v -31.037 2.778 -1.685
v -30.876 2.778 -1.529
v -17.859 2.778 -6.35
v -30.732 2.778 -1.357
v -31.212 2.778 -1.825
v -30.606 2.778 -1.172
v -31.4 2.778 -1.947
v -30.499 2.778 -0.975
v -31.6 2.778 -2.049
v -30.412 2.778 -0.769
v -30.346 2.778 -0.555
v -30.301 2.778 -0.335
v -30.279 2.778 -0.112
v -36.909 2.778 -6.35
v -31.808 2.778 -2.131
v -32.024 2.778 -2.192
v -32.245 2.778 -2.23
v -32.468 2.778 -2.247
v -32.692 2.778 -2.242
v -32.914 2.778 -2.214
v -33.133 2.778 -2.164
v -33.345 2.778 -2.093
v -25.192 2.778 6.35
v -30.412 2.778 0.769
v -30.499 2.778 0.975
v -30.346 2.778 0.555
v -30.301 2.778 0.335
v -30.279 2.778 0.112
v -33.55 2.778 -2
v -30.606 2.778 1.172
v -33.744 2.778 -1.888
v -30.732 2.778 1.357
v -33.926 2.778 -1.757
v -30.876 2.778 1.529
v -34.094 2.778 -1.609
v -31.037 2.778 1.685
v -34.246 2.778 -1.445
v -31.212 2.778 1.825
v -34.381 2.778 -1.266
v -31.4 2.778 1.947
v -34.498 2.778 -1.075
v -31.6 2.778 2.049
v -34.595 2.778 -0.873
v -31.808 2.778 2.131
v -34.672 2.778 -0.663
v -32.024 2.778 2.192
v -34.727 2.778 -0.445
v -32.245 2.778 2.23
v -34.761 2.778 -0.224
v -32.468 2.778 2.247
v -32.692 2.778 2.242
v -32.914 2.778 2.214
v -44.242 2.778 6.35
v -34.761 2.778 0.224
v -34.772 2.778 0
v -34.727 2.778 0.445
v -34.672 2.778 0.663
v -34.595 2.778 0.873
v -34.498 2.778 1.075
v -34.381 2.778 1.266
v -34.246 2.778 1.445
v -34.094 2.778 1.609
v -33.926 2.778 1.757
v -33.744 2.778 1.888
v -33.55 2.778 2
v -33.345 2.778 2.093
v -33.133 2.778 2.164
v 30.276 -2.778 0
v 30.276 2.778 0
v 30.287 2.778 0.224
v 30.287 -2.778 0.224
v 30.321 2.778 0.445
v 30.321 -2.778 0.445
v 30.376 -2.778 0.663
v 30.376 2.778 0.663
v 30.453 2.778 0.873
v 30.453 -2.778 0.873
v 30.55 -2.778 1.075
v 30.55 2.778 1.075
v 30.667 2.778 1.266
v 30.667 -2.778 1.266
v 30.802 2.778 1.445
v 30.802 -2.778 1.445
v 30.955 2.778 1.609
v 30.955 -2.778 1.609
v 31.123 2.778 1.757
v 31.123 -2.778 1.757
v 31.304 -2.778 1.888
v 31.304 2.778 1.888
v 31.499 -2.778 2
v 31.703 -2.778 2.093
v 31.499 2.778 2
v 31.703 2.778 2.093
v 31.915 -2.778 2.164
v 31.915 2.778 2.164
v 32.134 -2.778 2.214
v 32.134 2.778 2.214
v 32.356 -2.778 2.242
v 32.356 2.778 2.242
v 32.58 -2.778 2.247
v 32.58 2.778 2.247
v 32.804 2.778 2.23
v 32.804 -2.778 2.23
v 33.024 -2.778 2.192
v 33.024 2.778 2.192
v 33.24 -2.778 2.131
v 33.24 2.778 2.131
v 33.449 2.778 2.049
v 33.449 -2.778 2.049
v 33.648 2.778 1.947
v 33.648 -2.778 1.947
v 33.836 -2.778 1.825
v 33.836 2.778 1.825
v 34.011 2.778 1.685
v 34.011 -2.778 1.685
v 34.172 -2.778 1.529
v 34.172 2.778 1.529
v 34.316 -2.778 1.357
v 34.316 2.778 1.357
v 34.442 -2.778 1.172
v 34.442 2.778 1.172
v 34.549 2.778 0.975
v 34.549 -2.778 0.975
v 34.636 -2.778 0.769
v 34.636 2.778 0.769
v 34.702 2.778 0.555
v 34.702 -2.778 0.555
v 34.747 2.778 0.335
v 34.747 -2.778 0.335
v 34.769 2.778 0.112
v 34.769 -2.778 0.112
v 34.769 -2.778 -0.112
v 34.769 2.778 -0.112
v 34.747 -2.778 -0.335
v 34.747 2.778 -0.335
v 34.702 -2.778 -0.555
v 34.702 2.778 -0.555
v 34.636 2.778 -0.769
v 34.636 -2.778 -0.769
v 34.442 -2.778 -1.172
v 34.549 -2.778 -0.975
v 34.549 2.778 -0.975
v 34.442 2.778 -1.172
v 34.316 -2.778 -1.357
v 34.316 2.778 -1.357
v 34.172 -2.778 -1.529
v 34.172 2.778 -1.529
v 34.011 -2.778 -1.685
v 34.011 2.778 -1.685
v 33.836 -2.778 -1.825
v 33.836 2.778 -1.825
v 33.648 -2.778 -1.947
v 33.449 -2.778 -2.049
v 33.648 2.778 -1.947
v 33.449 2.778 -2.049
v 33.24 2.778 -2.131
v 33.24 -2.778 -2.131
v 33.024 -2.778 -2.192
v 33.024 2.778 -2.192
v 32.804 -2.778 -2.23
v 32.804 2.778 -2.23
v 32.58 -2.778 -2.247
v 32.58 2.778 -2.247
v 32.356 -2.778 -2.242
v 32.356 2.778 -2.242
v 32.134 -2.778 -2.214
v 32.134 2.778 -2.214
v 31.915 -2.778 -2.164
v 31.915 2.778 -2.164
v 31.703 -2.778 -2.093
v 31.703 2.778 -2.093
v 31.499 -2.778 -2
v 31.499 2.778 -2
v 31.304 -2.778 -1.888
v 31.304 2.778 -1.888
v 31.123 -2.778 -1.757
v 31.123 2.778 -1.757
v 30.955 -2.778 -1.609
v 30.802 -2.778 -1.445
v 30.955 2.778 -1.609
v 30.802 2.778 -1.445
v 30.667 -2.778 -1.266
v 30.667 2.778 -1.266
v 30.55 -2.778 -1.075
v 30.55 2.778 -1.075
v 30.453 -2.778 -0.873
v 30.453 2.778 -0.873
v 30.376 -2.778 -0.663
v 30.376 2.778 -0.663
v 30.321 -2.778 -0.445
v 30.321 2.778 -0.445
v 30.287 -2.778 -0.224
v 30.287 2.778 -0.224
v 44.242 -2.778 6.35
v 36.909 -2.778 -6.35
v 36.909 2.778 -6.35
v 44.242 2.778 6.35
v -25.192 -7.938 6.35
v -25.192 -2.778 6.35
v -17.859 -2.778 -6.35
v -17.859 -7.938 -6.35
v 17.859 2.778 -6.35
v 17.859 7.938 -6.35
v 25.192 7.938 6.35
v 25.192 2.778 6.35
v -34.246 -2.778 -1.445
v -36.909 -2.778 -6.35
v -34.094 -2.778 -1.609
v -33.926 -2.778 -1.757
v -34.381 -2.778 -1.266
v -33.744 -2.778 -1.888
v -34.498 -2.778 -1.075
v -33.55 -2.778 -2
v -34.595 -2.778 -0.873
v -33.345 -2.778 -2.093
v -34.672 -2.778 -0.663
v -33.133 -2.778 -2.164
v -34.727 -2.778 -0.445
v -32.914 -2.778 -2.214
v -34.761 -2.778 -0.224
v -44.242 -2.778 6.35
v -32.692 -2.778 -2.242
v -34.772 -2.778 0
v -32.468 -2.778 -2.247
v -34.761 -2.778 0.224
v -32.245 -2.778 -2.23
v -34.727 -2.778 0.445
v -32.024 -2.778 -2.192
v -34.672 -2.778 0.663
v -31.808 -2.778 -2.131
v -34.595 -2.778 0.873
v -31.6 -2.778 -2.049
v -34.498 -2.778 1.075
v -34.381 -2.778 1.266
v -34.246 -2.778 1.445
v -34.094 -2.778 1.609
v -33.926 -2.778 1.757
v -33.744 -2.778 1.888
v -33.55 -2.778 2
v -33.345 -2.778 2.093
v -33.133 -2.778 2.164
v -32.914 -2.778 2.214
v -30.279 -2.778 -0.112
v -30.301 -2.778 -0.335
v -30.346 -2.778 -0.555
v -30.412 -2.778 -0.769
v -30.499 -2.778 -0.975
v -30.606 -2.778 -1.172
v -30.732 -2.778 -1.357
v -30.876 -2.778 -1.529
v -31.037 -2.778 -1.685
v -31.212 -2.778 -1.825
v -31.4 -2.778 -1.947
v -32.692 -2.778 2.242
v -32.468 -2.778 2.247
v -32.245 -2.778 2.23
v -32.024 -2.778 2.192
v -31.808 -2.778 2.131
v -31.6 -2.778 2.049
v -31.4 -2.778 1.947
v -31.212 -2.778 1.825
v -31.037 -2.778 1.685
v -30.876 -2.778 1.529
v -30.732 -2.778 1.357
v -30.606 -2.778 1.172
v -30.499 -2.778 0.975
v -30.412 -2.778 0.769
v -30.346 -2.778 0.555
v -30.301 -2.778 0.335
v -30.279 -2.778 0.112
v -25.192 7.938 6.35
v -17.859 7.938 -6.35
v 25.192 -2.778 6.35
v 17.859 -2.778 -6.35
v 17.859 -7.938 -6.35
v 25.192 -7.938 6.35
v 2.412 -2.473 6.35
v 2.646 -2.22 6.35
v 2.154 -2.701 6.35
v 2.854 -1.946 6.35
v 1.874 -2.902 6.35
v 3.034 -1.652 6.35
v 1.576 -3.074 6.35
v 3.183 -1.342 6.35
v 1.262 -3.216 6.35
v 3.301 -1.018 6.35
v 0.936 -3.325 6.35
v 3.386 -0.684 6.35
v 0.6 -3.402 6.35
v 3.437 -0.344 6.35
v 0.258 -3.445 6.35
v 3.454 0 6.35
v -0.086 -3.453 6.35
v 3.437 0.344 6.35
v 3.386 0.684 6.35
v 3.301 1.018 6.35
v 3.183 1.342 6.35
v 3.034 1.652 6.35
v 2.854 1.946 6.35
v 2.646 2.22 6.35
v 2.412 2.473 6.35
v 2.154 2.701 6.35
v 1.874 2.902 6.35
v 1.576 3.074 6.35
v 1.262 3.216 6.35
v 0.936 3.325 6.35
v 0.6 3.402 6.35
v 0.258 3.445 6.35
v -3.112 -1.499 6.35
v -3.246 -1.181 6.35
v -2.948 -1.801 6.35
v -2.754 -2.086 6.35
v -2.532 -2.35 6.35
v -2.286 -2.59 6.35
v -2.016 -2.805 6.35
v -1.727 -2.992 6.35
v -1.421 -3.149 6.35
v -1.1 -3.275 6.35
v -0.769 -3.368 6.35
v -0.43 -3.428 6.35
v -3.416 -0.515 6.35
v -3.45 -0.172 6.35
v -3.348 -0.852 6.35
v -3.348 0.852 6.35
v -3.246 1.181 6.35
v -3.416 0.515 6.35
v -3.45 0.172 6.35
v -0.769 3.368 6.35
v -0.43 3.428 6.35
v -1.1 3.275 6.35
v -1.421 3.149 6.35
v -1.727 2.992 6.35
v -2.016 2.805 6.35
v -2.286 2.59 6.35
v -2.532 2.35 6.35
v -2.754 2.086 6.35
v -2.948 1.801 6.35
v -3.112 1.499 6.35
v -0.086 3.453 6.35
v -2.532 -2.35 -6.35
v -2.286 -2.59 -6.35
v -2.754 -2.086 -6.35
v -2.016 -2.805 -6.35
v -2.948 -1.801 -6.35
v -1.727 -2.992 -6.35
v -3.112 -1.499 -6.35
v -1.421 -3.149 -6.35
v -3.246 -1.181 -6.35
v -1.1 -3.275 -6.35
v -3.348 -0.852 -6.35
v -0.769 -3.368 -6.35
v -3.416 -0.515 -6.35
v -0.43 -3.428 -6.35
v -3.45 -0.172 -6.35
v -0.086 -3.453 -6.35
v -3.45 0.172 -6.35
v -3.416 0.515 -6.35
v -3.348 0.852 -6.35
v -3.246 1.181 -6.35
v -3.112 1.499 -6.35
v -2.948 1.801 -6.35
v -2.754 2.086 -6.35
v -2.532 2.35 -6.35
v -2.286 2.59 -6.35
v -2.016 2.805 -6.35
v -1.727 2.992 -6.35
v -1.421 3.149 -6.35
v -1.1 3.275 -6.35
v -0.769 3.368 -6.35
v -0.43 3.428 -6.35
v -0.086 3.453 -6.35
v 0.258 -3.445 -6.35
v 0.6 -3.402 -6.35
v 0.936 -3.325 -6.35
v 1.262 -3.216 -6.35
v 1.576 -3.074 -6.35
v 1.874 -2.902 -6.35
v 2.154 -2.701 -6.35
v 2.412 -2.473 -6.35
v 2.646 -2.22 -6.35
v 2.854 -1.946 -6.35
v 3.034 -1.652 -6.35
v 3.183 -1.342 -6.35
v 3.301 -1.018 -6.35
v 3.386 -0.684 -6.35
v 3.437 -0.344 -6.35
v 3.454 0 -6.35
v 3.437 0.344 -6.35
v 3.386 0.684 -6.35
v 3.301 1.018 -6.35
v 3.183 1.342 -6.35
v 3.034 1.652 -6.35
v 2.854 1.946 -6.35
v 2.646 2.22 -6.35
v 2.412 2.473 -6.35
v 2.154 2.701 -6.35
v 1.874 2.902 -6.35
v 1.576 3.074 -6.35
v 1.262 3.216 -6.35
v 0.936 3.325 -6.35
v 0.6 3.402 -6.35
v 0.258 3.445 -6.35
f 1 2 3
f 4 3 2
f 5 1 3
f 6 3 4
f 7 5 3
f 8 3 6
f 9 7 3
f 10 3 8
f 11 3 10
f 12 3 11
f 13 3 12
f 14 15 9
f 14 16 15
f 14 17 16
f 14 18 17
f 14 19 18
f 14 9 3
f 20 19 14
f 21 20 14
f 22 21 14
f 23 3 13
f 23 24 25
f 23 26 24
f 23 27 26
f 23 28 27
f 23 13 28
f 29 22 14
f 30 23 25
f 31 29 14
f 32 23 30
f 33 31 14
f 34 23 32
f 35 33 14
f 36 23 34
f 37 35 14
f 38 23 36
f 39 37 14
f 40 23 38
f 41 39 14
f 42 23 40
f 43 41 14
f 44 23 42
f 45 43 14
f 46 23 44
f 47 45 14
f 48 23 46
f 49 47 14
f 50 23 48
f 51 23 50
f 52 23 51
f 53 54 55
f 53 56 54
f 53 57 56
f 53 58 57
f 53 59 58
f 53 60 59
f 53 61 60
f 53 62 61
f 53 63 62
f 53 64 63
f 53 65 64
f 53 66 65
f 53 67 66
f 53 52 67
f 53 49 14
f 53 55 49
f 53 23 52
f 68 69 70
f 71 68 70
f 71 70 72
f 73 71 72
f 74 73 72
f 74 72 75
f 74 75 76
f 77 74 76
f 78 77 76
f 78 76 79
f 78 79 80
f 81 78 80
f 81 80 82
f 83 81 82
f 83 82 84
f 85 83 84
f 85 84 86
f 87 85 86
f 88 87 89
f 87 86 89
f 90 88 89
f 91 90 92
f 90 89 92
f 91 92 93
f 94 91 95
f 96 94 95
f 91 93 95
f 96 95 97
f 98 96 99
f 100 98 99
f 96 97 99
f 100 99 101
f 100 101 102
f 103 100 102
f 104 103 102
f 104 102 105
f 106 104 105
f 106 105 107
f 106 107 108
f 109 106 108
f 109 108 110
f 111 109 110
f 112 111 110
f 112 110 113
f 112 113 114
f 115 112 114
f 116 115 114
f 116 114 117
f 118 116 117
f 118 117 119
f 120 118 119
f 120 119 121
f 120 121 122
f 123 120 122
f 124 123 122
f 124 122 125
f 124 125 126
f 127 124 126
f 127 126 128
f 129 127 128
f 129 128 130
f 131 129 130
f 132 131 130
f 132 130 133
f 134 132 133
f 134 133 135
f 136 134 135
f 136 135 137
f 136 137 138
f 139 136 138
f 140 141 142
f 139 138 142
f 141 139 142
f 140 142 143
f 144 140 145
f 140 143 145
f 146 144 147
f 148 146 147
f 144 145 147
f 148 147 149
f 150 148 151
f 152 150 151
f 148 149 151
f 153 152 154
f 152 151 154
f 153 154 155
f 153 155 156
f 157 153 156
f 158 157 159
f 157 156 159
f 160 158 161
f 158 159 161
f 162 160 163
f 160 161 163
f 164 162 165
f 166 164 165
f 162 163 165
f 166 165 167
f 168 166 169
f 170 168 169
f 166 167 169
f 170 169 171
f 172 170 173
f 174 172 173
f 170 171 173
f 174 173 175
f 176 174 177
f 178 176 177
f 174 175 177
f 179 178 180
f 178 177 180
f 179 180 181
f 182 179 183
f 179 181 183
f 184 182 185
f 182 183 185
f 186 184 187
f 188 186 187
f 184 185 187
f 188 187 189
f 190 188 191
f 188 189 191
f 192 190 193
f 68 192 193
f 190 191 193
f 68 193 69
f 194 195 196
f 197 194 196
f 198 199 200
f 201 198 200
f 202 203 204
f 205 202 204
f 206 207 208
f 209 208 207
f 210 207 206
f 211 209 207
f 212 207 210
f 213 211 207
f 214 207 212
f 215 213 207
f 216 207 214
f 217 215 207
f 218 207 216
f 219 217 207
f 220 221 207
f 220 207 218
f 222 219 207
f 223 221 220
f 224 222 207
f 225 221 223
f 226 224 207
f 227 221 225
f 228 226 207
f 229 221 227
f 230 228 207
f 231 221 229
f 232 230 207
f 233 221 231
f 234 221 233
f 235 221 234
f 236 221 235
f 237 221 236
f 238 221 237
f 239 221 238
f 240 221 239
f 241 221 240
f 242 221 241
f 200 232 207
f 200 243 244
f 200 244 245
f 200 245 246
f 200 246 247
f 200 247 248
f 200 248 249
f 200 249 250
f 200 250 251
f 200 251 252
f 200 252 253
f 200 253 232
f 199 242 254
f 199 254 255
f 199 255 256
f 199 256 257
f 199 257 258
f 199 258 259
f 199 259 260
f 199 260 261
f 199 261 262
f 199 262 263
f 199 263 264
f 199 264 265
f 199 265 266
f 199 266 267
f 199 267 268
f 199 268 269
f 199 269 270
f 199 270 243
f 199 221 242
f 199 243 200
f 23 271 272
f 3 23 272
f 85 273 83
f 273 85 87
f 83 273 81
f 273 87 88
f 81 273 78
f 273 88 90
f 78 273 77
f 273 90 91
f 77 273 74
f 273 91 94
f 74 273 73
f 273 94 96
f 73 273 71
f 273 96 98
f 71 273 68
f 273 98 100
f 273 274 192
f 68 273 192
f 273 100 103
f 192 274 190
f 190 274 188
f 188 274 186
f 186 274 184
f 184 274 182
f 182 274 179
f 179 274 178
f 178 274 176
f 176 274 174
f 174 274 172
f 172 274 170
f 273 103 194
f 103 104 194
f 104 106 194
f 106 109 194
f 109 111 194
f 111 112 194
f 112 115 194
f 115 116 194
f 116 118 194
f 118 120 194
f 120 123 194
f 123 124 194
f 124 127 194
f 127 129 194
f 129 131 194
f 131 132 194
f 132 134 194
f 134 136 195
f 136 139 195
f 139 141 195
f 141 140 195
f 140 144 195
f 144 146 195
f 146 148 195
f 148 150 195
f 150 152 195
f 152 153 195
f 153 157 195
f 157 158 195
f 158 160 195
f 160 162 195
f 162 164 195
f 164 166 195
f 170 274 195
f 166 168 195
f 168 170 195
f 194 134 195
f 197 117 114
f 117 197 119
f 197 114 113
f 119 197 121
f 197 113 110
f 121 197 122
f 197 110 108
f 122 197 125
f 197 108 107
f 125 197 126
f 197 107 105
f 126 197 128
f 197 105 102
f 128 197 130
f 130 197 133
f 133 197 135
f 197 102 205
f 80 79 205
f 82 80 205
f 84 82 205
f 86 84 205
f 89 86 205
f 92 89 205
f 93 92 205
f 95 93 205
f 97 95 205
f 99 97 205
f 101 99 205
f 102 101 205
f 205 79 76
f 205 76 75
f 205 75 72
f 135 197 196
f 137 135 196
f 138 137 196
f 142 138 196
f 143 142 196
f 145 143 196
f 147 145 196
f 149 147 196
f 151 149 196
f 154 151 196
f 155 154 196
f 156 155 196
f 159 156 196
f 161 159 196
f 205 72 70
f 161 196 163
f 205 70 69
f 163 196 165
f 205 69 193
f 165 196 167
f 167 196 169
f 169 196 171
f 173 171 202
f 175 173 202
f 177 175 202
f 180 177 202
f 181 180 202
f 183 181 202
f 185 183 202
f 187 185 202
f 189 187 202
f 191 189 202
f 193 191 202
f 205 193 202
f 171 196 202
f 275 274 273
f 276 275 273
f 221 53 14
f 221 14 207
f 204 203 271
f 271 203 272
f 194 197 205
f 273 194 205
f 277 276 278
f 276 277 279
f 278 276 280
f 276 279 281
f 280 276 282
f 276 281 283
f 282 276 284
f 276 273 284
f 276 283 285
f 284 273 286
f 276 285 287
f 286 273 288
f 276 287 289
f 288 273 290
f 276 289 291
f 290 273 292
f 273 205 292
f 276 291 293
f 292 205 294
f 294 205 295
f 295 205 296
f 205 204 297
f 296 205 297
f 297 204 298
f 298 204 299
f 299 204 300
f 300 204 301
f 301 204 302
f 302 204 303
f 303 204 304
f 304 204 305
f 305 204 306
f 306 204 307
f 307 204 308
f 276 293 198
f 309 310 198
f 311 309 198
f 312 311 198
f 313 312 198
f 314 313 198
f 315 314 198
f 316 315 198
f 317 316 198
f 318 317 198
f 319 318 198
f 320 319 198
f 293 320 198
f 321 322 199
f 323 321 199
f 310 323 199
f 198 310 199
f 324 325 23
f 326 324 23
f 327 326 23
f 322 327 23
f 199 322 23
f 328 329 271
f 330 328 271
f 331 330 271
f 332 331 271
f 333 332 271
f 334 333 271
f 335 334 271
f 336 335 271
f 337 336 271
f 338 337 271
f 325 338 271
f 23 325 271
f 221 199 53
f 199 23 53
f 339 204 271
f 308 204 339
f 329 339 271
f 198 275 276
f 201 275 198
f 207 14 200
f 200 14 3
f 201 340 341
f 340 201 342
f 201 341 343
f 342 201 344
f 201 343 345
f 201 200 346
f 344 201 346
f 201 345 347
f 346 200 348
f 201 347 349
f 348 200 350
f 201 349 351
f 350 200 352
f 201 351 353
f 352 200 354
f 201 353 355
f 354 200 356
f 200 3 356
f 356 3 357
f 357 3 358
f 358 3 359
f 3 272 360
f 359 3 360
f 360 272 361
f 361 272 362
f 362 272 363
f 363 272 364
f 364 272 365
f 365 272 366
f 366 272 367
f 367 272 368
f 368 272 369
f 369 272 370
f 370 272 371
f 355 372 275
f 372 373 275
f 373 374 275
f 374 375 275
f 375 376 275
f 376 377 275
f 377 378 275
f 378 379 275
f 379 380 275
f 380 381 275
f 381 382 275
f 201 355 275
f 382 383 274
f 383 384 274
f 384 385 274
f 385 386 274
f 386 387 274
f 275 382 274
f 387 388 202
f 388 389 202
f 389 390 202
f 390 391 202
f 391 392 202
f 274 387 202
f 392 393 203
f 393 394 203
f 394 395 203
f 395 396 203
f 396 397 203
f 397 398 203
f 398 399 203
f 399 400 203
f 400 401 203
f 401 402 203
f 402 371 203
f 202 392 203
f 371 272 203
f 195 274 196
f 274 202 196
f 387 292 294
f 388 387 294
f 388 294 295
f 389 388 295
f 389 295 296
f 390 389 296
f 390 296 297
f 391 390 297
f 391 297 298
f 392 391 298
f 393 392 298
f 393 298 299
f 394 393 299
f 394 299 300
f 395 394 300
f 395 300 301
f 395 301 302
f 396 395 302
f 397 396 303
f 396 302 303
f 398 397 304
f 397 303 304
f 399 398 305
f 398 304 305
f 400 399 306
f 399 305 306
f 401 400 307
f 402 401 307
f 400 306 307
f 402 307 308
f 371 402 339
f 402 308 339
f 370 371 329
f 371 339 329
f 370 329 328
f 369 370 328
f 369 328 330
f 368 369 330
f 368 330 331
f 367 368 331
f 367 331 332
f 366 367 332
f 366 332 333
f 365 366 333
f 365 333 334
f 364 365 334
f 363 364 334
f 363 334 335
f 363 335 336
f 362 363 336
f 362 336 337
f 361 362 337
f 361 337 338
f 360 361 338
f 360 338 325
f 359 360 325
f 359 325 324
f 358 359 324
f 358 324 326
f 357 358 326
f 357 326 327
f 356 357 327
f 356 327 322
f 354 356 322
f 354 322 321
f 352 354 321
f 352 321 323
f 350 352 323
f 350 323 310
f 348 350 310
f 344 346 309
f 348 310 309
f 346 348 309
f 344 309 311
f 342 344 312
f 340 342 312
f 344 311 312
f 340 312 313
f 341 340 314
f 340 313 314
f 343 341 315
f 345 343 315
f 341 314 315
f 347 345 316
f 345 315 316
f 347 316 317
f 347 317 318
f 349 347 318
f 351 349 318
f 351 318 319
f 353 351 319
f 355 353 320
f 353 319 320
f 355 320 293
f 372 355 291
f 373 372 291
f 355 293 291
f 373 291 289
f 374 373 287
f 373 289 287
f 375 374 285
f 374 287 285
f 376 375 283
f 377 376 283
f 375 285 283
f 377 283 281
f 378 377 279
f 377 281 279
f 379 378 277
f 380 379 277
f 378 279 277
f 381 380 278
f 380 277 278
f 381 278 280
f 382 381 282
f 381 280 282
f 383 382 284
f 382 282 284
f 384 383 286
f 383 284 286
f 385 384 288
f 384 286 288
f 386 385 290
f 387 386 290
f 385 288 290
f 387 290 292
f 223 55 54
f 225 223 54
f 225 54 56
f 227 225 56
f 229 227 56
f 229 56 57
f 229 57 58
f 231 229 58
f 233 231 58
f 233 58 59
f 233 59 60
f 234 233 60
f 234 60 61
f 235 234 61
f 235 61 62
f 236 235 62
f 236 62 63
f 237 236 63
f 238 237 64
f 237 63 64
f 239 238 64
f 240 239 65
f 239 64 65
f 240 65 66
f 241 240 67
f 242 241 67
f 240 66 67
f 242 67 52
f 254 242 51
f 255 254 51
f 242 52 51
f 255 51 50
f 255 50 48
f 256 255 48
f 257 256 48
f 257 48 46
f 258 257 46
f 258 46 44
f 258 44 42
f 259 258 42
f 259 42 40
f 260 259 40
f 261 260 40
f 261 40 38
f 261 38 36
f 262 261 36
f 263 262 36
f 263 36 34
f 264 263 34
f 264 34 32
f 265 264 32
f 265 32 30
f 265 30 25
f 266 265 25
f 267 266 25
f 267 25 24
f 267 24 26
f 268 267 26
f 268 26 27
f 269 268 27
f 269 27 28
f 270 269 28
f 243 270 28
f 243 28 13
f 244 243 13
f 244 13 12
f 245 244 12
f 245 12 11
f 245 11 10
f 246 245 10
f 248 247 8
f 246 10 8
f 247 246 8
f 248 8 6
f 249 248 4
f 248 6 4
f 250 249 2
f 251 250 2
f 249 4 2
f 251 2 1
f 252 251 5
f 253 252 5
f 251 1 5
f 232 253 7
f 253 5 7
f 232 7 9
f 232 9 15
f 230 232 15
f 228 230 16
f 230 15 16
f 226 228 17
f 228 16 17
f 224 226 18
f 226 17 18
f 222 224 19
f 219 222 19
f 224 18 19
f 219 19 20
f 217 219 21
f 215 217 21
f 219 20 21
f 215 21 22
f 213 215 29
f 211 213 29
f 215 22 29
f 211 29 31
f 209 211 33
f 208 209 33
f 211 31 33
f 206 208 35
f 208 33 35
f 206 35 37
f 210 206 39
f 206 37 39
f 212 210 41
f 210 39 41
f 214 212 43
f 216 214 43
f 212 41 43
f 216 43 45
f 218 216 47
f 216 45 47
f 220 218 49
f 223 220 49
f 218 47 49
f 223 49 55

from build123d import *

# Parameters (mm, degrees)
BOSS_EXTRUDE1_DEPTH = 7.9375
SKETCH5_R           = 3.4544
CUT_EXTRUDE2_DEPTH  = 30.30728297
SKETCH6_W           = 19.05
SKETCH6_H           = 5.55625
SKETCH7_W           = 19.05
SKETCH7_H           = 5.55625
CUT_EXTRUDE3_REACH  = 47.962
SKETCH8_R           = 2.2479


with BuildPart() as part:
    # Sketch2 → Boss-Extrude1 (new, symmetric)
    with BuildSketch(Plane(origin=(0, 0, 0), x_dir=(1, 0, 0), z_dir=(0, 1, 0))):
        Polygon((-17.859375, 6.35), (17.859375, 6.35), (25.191723419, -6.35), (-25.191723419, -6.35), align=None)
    extrude(amount=BOSS_EXTRUDE1_DEPTH, both=True)

    # Sketch5 → Cut-Extrude2 (cut, through all)
    with BuildSketch(Plane.XY.offset(6.35)):
        Circle(SKETCH5_R)
    extrude(amount=-CUT_EXTRUDE2_DEPTH, mode=Mode.SUBTRACT)

    # Sweep1: sweep along a curve in space
    with BuildLine() as sweep1_path:
        Line((-17.859375, 7.9375, -6.35), (-25.191723419, 7.9375, 6.35))
    # Sketch6 → Sweep1 (sweep)
    with BuildSketch(Plane.XY.offset(6.35)):
        with Locations((-34.716723419, 0)):
            Rectangle(SKETCH6_W, SKETCH6_H)
    sweep(path=sweep1_path.line)

    # Sweep2: sweep along a curve in space
    with BuildLine() as sweep2_path:
        Line((25.191723419, 7.9375, 6.35), (17.859375, 7.9375, -6.35))
    # Sketch7 → Sweep2 (sweep)
    with BuildSketch(Plane.XY.offset(6.35)):
        with Locations((34.716723419, 0)):
            Rectangle(SKETCH7_W, SKETCH7_H)
    sweep(path=sweep2_path.line)

    # Sketch8 → Cut-Extrude3 (cut, up to next)
    with BuildSketch(Plane(origin=(0, 2.778125, 0), x_dir=(1, 0, 0), z_dir=(0, 1, 0)), mode=Mode.PRIVATE) as cut_extrude3_sk1:
        with Locations(Location((-32.524071837, 0, 0), (0, 0, 180))):
            Circle(SKETCH8_R)
    cut_extrude3_tool1 = extrude(cut_extrude3_sk1.sketch, amount=-CUT_EXTRUDE3_REACH, mode=Mode.PRIVATE) & part.part
    # Sketch8 → Cut-Extrude3 (cut, up to next)
    with BuildSketch(Plane(origin=(0, 2.778125, 0), x_dir=(1, 0, 0), z_dir=(0, 1, 0)), mode=Mode.PRIVATE) as cut_extrude3_sk2:
        with Locations(Location((32.524071837, 0, 0), (0, 0, 180))):
            Circle(SKETCH8_R)
    cut_extrude3_tool2 = extrude(cut_extrude3_sk2.sketch, amount=-CUT_EXTRUDE3_REACH, mode=Mode.PRIVATE) & part.part
    add(cut_extrude3_tool1.solids().sort_by_distance((-32.524072, 2.778125, 0))[0], mode=Mode.SUBTRACT)
    add(cut_extrude3_tool2.solids().sort_by_distance((32.524072, 2.778125, 0))[0], mode=Mode.SUBTRACT)


solid = part.part
